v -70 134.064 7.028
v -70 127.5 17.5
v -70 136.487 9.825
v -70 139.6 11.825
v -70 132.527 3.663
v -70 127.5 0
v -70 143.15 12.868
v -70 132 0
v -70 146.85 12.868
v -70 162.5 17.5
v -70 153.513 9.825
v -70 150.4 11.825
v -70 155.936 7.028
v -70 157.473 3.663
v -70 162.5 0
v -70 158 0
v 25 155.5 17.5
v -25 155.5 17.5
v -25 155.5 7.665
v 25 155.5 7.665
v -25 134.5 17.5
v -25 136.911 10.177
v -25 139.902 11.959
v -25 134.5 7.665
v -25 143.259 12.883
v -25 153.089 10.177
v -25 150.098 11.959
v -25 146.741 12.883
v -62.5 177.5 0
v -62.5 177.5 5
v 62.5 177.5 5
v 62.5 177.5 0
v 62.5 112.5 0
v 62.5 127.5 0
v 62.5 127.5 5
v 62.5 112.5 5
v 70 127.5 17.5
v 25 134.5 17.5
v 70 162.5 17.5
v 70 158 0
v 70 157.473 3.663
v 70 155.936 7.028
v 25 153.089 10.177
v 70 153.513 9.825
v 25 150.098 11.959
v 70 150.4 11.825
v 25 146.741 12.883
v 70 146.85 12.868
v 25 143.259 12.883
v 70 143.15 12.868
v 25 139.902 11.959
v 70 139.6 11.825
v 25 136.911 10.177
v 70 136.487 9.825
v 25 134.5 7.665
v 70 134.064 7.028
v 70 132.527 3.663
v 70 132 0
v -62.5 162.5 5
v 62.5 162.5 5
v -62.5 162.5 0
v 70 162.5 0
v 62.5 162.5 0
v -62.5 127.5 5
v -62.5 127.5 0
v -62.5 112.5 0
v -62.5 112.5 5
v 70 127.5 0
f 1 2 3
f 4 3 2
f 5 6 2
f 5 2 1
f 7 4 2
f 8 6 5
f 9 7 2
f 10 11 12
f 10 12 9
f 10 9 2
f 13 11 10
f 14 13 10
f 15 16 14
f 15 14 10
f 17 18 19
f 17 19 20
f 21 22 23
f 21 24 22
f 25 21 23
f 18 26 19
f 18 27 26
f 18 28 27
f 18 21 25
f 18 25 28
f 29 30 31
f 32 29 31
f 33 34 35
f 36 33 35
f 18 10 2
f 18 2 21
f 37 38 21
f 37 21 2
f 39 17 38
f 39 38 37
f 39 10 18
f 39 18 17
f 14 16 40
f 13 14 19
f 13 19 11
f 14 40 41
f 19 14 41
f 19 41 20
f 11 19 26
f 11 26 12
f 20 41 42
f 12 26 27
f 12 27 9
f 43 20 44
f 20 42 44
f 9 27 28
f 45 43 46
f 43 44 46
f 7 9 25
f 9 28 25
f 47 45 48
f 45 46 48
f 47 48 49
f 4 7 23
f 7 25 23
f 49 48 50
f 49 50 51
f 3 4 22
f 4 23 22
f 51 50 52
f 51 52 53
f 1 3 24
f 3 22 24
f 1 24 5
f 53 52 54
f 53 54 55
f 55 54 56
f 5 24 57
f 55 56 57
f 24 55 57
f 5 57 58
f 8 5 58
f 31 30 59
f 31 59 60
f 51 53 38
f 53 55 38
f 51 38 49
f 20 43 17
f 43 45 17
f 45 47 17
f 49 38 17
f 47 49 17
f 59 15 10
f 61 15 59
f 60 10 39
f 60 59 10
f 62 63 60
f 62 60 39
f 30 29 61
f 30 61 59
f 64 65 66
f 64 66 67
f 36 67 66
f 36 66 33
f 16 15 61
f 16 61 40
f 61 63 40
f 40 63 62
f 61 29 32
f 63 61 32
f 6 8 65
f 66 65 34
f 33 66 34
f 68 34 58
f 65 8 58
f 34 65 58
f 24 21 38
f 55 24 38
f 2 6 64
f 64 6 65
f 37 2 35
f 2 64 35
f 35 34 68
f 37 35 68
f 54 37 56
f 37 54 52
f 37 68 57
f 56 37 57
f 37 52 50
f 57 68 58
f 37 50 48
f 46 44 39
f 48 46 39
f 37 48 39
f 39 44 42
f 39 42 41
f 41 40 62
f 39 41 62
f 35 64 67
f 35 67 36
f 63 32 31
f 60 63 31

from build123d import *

# Parameters (mm, degrees)
CROQUIS2_W                   = 140
CROQUIS2_H                   = 35
SALIENTE_EXTRUIR1_DEPTH      = 17.5
SALIENTE_EXTRUIR2_DEPTH      = 15
SALIENTE_EXTRUIR2_DEPTH_BACK = 50
CROQUIS3_W                   = 125
CROQUIS3_H                   = 5
CROQUIS4_R                   = 13
CORTAR_EXTRUIR1_DEPTH        = 140
CROQUIS5_W                   = 50
CROQUIS5_H                   = 21
CORTAR_EXTRUIR2_DEPTH        = 192.605062564


with BuildPart() as part:
    # Croquis2 → Saliente-Extruir1 (new body)
    with BuildSketch(Plane.XY):
        with Locations((0, 145)):
            Rectangle(CROQUIS2_W, CROQUIS2_H)
    extrude(amount=SALIENTE_EXTRUIR1_DEPTH)

    # Croquis3 → Saliente-Extruir2 (add, two sides: drawn at the far end of the back side and taken through both)
    with BuildSketch(Plane.XZ.offset(-127.5).offset(-SALIENTE_EXTRUIR2_DEPTH_BACK)):
        with Locations((0, 2.5)):
            Rectangle(CROQUIS3_W, CROQUIS3_H)
    extrude(amount=SALIENTE_EXTRUIR2_DEPTH + SALIENTE_EXTRUIR2_DEPTH_BACK)

    # Croquis4 → Cortar-Extruir1 (cut)
    with BuildSketch(Plane(origin=(70, 0, 0), x_dir=(0, 0, -1), z_dir=(1, 0, 0))):
        with Locations((0, 145)):
            Circle(CROQUIS4_R)
    extrude(amount=-CORTAR_EXTRUIR1_DEPTH, mode=Mode.SUBTRACT)

    # Croquis5 → Cortar-Extruir2 (cut, through all)
    with BuildSketch(Plane.XY.offset(17.5)):
        with Locations((0, 145)):
            Rectangle(CROQUIS5_W, CROQUIS5_H)
    extrude(amount=-CORTAR_EXTRUIR2_DEPTH, mode=Mode.SUBTRACT)


solid = part.part
